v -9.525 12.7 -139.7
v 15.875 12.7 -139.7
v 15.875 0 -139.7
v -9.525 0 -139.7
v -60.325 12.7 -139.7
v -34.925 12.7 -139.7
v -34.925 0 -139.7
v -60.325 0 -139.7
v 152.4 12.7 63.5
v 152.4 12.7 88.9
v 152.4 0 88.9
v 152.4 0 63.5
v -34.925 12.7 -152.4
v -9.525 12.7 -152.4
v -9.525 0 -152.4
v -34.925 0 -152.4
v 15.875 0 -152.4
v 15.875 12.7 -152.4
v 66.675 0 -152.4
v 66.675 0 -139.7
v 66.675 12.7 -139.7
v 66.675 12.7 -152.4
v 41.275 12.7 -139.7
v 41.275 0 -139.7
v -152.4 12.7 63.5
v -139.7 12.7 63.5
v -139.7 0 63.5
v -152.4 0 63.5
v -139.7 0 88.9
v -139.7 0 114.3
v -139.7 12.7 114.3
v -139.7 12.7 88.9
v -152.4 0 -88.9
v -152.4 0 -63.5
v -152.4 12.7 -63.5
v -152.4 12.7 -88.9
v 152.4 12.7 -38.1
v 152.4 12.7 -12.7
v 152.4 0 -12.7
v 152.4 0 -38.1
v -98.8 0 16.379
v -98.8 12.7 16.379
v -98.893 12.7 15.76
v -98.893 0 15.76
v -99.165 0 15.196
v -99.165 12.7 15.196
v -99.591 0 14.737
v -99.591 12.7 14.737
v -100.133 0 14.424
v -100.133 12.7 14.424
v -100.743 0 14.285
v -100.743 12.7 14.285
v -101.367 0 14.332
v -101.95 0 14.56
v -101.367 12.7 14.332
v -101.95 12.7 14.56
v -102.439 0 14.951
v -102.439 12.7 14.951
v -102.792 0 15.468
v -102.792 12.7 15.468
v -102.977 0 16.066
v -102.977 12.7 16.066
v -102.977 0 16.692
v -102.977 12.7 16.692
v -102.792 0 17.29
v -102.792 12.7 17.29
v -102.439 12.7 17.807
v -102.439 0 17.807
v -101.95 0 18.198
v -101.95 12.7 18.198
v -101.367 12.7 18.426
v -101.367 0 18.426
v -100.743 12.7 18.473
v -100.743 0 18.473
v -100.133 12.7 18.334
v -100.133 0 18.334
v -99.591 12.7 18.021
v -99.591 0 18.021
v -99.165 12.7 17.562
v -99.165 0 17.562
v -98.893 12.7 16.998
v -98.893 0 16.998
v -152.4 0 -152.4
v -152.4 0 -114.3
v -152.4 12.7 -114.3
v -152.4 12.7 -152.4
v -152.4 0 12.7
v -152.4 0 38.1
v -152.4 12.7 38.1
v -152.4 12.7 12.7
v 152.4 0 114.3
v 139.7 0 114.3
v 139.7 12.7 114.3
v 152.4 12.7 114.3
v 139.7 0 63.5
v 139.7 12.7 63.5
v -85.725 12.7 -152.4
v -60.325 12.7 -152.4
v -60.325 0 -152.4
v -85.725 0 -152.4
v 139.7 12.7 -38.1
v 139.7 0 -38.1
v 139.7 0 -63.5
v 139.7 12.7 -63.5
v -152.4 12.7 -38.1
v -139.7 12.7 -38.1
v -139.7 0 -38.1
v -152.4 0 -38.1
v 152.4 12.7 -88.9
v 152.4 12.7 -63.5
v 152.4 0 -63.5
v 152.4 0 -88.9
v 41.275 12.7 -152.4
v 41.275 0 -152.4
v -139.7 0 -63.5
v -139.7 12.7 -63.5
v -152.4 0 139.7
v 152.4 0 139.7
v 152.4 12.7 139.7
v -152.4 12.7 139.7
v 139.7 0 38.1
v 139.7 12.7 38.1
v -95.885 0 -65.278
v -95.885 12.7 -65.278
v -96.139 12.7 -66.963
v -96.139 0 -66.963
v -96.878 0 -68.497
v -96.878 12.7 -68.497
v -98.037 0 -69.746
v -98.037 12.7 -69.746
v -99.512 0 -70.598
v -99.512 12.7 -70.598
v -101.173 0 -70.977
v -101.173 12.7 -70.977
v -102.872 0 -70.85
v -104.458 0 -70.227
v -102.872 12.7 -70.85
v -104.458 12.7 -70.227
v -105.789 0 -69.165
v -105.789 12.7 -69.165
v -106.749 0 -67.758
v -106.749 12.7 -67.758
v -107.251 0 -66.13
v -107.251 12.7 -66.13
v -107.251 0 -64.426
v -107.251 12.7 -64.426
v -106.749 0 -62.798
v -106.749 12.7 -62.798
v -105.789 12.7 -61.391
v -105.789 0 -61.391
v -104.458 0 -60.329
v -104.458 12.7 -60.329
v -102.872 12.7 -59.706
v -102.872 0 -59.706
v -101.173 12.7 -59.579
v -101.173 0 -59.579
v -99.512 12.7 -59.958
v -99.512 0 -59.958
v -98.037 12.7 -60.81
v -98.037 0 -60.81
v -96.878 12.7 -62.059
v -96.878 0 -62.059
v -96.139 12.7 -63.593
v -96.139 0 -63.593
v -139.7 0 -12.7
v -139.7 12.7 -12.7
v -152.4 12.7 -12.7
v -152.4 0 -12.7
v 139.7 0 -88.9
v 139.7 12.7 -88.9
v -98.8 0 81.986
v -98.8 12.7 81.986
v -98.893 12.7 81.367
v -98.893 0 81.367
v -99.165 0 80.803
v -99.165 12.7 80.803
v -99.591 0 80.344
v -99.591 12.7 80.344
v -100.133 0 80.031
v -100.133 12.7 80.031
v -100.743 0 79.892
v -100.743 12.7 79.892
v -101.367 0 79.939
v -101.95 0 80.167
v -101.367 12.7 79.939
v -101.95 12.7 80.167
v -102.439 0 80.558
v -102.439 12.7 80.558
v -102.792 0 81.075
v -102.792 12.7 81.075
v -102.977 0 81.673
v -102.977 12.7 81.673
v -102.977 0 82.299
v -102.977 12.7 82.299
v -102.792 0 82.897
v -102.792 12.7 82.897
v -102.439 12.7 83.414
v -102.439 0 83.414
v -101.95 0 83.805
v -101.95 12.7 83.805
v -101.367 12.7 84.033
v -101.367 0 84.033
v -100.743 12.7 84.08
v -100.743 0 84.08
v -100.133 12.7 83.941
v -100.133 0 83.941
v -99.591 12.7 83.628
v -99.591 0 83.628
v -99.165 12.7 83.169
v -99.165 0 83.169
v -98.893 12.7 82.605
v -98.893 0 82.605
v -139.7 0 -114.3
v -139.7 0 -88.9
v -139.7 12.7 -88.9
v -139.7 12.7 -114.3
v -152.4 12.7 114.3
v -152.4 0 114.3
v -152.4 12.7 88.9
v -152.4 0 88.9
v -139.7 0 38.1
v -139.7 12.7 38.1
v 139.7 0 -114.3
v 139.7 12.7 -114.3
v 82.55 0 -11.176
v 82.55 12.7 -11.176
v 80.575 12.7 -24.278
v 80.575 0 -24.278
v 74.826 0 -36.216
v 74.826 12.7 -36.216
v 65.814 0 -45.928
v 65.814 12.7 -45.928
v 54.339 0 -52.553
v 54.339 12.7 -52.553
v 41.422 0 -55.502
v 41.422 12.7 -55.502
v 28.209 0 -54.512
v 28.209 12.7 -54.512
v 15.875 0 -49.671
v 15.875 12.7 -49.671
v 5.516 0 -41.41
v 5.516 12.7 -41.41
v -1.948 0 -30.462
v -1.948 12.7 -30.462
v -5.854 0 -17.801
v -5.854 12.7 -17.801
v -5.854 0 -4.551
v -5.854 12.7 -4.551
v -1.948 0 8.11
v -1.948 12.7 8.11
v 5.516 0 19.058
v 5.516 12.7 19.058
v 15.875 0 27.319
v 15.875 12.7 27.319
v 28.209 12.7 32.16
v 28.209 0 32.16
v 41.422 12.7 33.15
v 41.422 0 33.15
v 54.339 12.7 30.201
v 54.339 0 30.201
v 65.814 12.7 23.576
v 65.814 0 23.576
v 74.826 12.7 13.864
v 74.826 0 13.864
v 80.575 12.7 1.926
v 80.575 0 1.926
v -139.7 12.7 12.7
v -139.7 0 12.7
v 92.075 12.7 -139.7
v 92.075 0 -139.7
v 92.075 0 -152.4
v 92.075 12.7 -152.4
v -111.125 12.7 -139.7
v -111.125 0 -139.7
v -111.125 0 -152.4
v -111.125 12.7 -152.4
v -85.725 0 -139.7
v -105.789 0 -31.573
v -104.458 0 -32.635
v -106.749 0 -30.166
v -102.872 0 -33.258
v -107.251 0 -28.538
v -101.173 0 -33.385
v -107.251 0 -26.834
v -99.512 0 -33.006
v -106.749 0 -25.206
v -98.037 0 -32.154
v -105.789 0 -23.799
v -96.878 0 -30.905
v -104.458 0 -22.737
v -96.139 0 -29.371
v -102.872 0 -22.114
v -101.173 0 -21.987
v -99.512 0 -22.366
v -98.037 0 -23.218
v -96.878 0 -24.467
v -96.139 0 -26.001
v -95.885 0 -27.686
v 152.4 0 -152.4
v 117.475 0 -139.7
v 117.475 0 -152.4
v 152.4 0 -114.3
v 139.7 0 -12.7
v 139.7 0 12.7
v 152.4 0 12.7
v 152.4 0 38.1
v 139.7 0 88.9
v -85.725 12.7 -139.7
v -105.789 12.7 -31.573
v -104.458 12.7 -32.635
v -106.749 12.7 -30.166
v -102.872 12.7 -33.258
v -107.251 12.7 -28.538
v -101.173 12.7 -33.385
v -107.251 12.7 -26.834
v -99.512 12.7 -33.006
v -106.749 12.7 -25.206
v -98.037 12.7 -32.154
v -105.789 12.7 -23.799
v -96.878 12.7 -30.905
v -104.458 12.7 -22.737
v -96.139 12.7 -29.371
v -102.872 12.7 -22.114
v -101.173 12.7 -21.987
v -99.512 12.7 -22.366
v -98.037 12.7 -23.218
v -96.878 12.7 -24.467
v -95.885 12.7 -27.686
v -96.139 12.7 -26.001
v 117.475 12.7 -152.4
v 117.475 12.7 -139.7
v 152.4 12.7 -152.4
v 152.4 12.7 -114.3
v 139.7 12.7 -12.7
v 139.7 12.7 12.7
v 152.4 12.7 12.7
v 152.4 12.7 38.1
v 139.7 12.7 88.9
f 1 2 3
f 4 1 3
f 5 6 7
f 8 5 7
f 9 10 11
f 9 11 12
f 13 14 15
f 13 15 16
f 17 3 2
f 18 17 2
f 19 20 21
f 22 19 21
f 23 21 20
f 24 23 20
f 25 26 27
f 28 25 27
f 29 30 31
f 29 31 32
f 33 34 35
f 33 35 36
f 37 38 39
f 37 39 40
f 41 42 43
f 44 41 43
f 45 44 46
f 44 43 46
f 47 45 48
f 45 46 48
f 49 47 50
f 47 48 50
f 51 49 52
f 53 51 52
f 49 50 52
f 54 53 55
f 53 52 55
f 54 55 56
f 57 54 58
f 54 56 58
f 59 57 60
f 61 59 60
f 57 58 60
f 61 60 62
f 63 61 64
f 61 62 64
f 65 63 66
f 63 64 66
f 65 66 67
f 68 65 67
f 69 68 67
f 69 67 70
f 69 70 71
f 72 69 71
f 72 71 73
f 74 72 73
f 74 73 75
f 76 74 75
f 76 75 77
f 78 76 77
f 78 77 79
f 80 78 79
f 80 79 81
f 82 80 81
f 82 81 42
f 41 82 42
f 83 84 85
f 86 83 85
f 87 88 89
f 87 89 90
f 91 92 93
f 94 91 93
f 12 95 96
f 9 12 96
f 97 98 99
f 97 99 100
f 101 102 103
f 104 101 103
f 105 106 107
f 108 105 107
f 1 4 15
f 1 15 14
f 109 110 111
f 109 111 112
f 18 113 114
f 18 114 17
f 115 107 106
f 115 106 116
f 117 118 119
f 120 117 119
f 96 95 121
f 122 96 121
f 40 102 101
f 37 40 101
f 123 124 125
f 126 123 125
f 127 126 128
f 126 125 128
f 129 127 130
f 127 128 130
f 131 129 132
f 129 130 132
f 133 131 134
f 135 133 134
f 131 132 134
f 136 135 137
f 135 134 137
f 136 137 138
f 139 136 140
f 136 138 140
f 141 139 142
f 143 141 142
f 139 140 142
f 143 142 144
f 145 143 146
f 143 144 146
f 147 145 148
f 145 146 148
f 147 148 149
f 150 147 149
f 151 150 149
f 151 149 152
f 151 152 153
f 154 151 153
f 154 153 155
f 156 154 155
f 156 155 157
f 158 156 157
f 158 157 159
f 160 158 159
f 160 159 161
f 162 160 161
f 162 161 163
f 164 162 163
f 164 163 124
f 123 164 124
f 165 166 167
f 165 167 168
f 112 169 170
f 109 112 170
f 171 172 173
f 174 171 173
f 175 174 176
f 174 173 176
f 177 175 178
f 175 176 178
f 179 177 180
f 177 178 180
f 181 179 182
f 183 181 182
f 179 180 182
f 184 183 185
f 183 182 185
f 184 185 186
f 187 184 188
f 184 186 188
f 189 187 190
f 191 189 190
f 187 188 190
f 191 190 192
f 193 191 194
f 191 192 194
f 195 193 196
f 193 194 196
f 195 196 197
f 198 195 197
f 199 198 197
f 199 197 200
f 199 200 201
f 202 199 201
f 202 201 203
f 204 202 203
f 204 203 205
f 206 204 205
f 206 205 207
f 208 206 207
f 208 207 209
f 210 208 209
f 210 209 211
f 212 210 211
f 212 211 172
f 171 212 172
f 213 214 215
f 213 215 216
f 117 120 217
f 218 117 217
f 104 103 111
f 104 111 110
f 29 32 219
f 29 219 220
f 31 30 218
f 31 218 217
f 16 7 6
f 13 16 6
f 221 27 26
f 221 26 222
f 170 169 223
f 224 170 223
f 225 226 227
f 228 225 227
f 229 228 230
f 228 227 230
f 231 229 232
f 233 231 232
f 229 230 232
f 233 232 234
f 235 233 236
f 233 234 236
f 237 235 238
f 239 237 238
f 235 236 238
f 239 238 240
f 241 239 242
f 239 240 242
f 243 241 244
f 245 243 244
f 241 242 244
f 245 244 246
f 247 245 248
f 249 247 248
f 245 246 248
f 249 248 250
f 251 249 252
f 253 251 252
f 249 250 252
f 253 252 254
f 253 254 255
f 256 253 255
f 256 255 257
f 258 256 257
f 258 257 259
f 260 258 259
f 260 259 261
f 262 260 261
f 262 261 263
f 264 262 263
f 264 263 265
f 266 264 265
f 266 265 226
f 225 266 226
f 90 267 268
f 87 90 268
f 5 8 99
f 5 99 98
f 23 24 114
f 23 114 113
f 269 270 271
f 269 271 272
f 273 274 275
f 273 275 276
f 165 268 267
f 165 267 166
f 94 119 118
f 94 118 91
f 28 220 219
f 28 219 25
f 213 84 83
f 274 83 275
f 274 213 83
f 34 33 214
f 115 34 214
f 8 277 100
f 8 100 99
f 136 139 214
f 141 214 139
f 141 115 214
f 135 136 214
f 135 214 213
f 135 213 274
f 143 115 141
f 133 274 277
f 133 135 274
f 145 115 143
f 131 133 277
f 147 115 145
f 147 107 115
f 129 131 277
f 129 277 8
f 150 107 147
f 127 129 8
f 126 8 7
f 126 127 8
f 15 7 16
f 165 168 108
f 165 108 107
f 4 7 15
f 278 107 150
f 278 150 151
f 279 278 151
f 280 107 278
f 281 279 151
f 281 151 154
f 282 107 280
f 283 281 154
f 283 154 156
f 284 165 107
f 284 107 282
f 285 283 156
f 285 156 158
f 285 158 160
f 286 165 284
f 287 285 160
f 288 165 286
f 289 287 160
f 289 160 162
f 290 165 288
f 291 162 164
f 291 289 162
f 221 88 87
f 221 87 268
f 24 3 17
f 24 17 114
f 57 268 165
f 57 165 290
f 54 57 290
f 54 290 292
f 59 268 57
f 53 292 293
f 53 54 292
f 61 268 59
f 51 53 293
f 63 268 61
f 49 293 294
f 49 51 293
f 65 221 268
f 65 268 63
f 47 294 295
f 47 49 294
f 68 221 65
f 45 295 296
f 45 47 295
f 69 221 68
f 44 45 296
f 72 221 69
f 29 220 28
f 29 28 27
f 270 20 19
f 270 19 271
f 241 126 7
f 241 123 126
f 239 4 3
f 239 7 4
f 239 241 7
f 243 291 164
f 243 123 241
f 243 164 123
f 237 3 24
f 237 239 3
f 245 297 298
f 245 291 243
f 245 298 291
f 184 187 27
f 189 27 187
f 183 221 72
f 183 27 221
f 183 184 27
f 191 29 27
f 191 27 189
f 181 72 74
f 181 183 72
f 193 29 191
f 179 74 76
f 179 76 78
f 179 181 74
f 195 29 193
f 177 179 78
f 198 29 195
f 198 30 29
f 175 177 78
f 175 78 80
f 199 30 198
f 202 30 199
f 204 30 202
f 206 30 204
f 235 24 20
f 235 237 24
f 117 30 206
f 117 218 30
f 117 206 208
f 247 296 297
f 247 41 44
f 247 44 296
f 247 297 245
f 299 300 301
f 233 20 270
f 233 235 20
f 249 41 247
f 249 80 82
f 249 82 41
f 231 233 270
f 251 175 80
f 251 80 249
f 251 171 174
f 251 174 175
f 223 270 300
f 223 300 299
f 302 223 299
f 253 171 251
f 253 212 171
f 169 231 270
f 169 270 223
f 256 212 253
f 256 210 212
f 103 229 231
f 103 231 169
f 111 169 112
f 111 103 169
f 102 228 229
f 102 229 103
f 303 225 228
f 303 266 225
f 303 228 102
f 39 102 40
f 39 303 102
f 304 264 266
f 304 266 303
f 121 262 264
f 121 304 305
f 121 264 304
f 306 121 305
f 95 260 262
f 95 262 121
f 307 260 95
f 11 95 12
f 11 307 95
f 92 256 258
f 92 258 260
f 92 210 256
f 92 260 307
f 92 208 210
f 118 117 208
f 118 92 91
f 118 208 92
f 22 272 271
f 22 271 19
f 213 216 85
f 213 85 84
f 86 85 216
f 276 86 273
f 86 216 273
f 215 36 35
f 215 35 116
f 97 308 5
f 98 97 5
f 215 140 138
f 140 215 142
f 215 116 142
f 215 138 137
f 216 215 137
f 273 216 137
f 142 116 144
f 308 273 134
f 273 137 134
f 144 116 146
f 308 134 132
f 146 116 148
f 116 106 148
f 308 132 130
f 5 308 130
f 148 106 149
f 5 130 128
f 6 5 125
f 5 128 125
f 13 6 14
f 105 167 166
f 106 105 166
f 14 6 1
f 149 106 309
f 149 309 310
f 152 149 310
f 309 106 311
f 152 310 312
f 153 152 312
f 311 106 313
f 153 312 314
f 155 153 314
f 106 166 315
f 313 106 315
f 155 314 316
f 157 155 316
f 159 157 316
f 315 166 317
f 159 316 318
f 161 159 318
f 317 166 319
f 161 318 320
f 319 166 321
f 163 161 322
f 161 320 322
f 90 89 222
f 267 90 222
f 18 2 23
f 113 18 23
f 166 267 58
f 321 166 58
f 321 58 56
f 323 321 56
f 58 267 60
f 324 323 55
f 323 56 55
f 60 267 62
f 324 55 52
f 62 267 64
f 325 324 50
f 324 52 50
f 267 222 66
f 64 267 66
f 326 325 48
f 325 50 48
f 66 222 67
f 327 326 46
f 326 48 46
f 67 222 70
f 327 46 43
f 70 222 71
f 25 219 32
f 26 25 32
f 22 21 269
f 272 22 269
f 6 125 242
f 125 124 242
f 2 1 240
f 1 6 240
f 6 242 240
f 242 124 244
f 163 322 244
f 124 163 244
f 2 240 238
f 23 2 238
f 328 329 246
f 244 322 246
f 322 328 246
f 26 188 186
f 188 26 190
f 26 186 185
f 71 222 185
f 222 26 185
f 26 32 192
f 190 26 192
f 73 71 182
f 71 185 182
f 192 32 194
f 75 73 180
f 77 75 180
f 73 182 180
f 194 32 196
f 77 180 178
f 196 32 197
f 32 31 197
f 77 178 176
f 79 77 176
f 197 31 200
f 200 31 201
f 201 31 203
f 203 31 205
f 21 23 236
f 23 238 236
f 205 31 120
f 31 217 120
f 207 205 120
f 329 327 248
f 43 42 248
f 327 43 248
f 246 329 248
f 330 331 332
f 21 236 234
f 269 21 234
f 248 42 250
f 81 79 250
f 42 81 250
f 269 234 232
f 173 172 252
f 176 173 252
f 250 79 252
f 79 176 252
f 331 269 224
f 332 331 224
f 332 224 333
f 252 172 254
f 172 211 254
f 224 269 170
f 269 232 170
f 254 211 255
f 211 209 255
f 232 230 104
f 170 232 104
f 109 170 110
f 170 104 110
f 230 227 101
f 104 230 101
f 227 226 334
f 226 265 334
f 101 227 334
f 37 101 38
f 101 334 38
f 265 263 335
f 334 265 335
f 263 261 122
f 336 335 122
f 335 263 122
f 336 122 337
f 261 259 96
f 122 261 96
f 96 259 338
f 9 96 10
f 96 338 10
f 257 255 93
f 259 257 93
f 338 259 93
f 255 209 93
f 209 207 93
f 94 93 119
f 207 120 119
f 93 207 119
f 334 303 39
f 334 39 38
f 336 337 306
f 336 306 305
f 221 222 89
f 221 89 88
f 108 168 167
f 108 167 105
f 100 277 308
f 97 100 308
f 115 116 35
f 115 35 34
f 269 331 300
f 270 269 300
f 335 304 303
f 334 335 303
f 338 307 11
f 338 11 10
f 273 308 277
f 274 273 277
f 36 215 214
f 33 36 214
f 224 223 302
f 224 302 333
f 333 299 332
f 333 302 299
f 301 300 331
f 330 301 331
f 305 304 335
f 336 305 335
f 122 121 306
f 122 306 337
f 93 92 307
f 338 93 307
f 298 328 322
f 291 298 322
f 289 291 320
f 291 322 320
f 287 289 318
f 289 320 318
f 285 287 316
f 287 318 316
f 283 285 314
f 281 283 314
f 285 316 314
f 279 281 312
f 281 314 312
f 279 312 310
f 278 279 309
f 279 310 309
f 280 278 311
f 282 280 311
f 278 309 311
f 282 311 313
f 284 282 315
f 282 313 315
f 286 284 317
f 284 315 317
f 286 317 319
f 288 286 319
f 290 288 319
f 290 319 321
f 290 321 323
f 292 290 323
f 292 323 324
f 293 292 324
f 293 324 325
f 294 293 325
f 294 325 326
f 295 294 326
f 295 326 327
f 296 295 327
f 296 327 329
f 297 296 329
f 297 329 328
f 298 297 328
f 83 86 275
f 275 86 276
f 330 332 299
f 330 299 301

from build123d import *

# Parameters (mm, degrees)
SKETCH1_W               = 279.4
SKETCH1_H               = 279.4
BOSS_EXTRUDE1_DEPTH     = 12.7
SKETCH2_W               = 25.4
SKETCH2_H               = 12.7
BOSS_EXTRUDE2_DEPTH     = 12.7
LPATTERN1_COUNT         = 6
LPATTERN1_PITCH         = 50.8
MIRROR1_COPY_1_SKETCH_W = 25.4
MIRROR1_COPY_1_SKETCH_H = 12.7
MIRROR1_COPY_1_DEPTH    = 12.7
MIRROR1_COPY_2_SKETCH_W = 25.4
MIRROR1_COPY_2_SKETCH_H = 12.7
MIRROR1_COPY_2_DEPTH    = 12.7
MIRROR1_COPY_3_SKETCH_W = 25.4
MIRROR1_COPY_3_SKETCH_H = 12.7
MIRROR1_COPY_3_DEPTH    = 12.7
MIRROR1_COPY_4_SKETCH_W = 25.4
MIRROR1_COPY_4_SKETCH_H = 12.7
MIRROR1_COPY_4_DEPTH    = 12.7
MIRROR1_COPY_5_SKETCH_W = 25.4
MIRROR1_COPY_5_SKETCH_H = 12.7
MIRROR1_COPY_5_DEPTH    = 12.7
SKETCH3_W               = 25.4
SKETCH3_H               = 12.7
BOSS_EXTRUDE3_DEPTH     = 12.7
LPATTERN2_COUNT         = 6
LPATTERN2_PITCH         = 50.8
SKETCH5_W               = 17.00363529
SKETCH5_H               = 12.7
BOSS_EXTRUDE4_DEPTH     = 12.7
SKETCH6_R               = 44.45
CUT_EXTRUDE1_DEPTH      = 13.7
SKETCH7_R               = 5.715
CUT_EXTRUDE2_DEPTH      = 13.7
SKETCH8_R               = 2.1
CUT_EXTRUDE3_DEPTH      = 13.7


with BuildPart() as part:
    # Sketch1 → Boss-Extrude1 (new body)
    with BuildSketch(Plane(origin=(0, 0, 0), x_dir=(1, 0, 0), z_dir=(0, 1, 0))):
        Rectangle(SKETCH1_W, SKETCH1_H)
    extrude(amount=BOSS_EXTRUDE1_DEPTH)

    # Sketch2 → Boss-Extrude2 (add)
    with BuildSketch(Plane(origin=(139.7, 0, 0), x_dir=(0, 0, -1), z_dir=(1, 0, 0))):
        with Locations((-127, 6.35)):
            Rectangle(SKETCH2_W, SKETCH2_H)
    boss_extrude2 = extrude(amount=BOSS_EXTRUDE2_DEPTH)

    # LPattern1: Boss-Extrude2 ×6
    with Locations(*[(0, 0, -i * LPATTERN1_PITCH) for i in range(1, LPATTERN1_COUNT)]):
        add(boss_extrude2)

    # Mirror1: Boss-Extrude2 across plane
    add(boss_extrude2.mirror(Plane(origin=(0, 0, 0), x_dir=(0, 0, 1), z_dir=(1, 0, 0))))

    # Mirror1 copy 1 sketch → Mirror1 copy 1 (add)
    with BuildSketch(Plane(origin=(-139.7, 0, -50.8), x_dir=(0, 0, -1), z_dir=(-1, 0, 0))):
        with Locations((-127, -6.35)):
            Rectangle(MIRROR1_COPY_1_SKETCH_W, MIRROR1_COPY_1_SKETCH_H)
    extrude(amount=MIRROR1_COPY_1_DEPTH)

    # Mirror1 copy 2 sketch → Mirror1 copy 2 (add)
    with BuildSketch(Plane(origin=(-139.7, 0, -101.6), x_dir=(0, 0, -1), z_dir=(-1, 0, 0))):
        with Locations((-127, -6.35)):
            Rectangle(MIRROR1_COPY_2_SKETCH_W, MIRROR1_COPY_2_SKETCH_H)
    extrude(amount=MIRROR1_COPY_2_DEPTH)

    # Mirror1 copy 3 sketch → Mirror1 copy 3 (add)
    with BuildSketch(Plane(origin=(-139.7, 0, -152.4), x_dir=(0, 0, -1), z_dir=(-1, 0, 0))):
        with Locations((-127, -6.35)):
            Rectangle(MIRROR1_COPY_3_SKETCH_W, MIRROR1_COPY_3_SKETCH_H)
    extrude(amount=MIRROR1_COPY_3_DEPTH)

    # Mirror1 copy 4 sketch → Mirror1 copy 4 (add)
    with BuildSketch(Plane(origin=(-139.7, 0, -203.2), x_dir=(0, 0, -1), z_dir=(-1, 0, 0))):
        with Locations((-127, -6.35)):
            Rectangle(MIRROR1_COPY_4_SKETCH_W, MIRROR1_COPY_4_SKETCH_H)
    extrude(amount=MIRROR1_COPY_4_DEPTH)

    # Mirror1 copy 5 sketch → Mirror1 copy 5 (add)
    with BuildSketch(Plane(origin=(-139.7, 0, -254), x_dir=(0, 0, -1), z_dir=(-1, 0, 0))):
        with Locations((-127, -6.35)):
            Rectangle(MIRROR1_COPY_5_SKETCH_W, MIRROR1_COPY_5_SKETCH_H)
    extrude(amount=MIRROR1_COPY_5_DEPTH)

    # Sketch3 → Boss-Extrude3 (add)
    with BuildSketch(Plane(origin=(0, 0, -139.7), x_dir=(-1, 0, 0), z_dir=(0, 0, -1))):
        with Locations((-130.175, 6.35)):
            Rectangle(SKETCH3_W, SKETCH3_H)
    boss_extrude3 = extrude(amount=BOSS_EXTRUDE3_DEPTH)

    # LPattern2: Boss-Extrude3 ×6
    with Locations(*[(-i * LPATTERN2_PITCH, 0, 0) for i in range(1, LPATTERN2_COUNT)]):
        add(boss_extrude3)

    # Sketch5 → Boss-Extrude4 (add)
    with BuildSketch(Plane(origin=(0, 0, -139.7), x_dir=(-1, 0, 0), z_dir=(0, 0, -1))):
        with Locations((-143.898182355, 6.35)):
            Rectangle(SKETCH5_W, SKETCH5_H)
    boss_extrude4 = extrude(amount=BOSS_EXTRUDE4_DEPTH)

    # Mirror2: Boss-Extrude4 across plane
    add(boss_extrude4.mirror(Plane(origin=(0, 0, 0), x_dir=(0, 0, 1), z_dir=(1, 0, 0))))

    # Sketch6 → Cut-Extrude1 (cut, through all)
    with BuildSketch(Plane(origin=(0, 12.7, 0), x_dir=(1, 0, 0), z_dir=(0, 1, 0))):
        with Locations((38.1, 11.176)):
            Circle(SKETCH6_R)
    extrude(amount=-CUT_EXTRUDE1_DEPTH, mode=Mode.SUBTRACT)

    # Sketch7 → Cut-Extrude2 (cut, through all)
    with BuildSketch(Plane(origin=(0, 12.7, 0), x_dir=(1, 0, 0), z_dir=(0, 1, 0))):
        with Locations((-101.6, 65.278)):
            Circle(SKETCH7_R)
        with Locations((-101.6, 27.686)):
            Circle(SKETCH7_R)
    extrude(amount=-CUT_EXTRUDE2_DEPTH, mode=Mode.SUBTRACT)

    # Sketch8 → Cut-Extrude3 (cut, through all)
    with BuildSketch(Plane(origin=(0, 12.7, 0), x_dir=(1, 0, 0), z_dir=(0, 1, 0))):
        with Locations((-100.9, -81.986081859)):
            Circle(SKETCH8_R)
        with Locations((-100.9, -16.378881859)):
            Circle(SKETCH8_R)
    extrude(amount=-CUT_EXTRUDE3_DEPTH, mode=Mode.SUBTRACT)


solid = part.part
